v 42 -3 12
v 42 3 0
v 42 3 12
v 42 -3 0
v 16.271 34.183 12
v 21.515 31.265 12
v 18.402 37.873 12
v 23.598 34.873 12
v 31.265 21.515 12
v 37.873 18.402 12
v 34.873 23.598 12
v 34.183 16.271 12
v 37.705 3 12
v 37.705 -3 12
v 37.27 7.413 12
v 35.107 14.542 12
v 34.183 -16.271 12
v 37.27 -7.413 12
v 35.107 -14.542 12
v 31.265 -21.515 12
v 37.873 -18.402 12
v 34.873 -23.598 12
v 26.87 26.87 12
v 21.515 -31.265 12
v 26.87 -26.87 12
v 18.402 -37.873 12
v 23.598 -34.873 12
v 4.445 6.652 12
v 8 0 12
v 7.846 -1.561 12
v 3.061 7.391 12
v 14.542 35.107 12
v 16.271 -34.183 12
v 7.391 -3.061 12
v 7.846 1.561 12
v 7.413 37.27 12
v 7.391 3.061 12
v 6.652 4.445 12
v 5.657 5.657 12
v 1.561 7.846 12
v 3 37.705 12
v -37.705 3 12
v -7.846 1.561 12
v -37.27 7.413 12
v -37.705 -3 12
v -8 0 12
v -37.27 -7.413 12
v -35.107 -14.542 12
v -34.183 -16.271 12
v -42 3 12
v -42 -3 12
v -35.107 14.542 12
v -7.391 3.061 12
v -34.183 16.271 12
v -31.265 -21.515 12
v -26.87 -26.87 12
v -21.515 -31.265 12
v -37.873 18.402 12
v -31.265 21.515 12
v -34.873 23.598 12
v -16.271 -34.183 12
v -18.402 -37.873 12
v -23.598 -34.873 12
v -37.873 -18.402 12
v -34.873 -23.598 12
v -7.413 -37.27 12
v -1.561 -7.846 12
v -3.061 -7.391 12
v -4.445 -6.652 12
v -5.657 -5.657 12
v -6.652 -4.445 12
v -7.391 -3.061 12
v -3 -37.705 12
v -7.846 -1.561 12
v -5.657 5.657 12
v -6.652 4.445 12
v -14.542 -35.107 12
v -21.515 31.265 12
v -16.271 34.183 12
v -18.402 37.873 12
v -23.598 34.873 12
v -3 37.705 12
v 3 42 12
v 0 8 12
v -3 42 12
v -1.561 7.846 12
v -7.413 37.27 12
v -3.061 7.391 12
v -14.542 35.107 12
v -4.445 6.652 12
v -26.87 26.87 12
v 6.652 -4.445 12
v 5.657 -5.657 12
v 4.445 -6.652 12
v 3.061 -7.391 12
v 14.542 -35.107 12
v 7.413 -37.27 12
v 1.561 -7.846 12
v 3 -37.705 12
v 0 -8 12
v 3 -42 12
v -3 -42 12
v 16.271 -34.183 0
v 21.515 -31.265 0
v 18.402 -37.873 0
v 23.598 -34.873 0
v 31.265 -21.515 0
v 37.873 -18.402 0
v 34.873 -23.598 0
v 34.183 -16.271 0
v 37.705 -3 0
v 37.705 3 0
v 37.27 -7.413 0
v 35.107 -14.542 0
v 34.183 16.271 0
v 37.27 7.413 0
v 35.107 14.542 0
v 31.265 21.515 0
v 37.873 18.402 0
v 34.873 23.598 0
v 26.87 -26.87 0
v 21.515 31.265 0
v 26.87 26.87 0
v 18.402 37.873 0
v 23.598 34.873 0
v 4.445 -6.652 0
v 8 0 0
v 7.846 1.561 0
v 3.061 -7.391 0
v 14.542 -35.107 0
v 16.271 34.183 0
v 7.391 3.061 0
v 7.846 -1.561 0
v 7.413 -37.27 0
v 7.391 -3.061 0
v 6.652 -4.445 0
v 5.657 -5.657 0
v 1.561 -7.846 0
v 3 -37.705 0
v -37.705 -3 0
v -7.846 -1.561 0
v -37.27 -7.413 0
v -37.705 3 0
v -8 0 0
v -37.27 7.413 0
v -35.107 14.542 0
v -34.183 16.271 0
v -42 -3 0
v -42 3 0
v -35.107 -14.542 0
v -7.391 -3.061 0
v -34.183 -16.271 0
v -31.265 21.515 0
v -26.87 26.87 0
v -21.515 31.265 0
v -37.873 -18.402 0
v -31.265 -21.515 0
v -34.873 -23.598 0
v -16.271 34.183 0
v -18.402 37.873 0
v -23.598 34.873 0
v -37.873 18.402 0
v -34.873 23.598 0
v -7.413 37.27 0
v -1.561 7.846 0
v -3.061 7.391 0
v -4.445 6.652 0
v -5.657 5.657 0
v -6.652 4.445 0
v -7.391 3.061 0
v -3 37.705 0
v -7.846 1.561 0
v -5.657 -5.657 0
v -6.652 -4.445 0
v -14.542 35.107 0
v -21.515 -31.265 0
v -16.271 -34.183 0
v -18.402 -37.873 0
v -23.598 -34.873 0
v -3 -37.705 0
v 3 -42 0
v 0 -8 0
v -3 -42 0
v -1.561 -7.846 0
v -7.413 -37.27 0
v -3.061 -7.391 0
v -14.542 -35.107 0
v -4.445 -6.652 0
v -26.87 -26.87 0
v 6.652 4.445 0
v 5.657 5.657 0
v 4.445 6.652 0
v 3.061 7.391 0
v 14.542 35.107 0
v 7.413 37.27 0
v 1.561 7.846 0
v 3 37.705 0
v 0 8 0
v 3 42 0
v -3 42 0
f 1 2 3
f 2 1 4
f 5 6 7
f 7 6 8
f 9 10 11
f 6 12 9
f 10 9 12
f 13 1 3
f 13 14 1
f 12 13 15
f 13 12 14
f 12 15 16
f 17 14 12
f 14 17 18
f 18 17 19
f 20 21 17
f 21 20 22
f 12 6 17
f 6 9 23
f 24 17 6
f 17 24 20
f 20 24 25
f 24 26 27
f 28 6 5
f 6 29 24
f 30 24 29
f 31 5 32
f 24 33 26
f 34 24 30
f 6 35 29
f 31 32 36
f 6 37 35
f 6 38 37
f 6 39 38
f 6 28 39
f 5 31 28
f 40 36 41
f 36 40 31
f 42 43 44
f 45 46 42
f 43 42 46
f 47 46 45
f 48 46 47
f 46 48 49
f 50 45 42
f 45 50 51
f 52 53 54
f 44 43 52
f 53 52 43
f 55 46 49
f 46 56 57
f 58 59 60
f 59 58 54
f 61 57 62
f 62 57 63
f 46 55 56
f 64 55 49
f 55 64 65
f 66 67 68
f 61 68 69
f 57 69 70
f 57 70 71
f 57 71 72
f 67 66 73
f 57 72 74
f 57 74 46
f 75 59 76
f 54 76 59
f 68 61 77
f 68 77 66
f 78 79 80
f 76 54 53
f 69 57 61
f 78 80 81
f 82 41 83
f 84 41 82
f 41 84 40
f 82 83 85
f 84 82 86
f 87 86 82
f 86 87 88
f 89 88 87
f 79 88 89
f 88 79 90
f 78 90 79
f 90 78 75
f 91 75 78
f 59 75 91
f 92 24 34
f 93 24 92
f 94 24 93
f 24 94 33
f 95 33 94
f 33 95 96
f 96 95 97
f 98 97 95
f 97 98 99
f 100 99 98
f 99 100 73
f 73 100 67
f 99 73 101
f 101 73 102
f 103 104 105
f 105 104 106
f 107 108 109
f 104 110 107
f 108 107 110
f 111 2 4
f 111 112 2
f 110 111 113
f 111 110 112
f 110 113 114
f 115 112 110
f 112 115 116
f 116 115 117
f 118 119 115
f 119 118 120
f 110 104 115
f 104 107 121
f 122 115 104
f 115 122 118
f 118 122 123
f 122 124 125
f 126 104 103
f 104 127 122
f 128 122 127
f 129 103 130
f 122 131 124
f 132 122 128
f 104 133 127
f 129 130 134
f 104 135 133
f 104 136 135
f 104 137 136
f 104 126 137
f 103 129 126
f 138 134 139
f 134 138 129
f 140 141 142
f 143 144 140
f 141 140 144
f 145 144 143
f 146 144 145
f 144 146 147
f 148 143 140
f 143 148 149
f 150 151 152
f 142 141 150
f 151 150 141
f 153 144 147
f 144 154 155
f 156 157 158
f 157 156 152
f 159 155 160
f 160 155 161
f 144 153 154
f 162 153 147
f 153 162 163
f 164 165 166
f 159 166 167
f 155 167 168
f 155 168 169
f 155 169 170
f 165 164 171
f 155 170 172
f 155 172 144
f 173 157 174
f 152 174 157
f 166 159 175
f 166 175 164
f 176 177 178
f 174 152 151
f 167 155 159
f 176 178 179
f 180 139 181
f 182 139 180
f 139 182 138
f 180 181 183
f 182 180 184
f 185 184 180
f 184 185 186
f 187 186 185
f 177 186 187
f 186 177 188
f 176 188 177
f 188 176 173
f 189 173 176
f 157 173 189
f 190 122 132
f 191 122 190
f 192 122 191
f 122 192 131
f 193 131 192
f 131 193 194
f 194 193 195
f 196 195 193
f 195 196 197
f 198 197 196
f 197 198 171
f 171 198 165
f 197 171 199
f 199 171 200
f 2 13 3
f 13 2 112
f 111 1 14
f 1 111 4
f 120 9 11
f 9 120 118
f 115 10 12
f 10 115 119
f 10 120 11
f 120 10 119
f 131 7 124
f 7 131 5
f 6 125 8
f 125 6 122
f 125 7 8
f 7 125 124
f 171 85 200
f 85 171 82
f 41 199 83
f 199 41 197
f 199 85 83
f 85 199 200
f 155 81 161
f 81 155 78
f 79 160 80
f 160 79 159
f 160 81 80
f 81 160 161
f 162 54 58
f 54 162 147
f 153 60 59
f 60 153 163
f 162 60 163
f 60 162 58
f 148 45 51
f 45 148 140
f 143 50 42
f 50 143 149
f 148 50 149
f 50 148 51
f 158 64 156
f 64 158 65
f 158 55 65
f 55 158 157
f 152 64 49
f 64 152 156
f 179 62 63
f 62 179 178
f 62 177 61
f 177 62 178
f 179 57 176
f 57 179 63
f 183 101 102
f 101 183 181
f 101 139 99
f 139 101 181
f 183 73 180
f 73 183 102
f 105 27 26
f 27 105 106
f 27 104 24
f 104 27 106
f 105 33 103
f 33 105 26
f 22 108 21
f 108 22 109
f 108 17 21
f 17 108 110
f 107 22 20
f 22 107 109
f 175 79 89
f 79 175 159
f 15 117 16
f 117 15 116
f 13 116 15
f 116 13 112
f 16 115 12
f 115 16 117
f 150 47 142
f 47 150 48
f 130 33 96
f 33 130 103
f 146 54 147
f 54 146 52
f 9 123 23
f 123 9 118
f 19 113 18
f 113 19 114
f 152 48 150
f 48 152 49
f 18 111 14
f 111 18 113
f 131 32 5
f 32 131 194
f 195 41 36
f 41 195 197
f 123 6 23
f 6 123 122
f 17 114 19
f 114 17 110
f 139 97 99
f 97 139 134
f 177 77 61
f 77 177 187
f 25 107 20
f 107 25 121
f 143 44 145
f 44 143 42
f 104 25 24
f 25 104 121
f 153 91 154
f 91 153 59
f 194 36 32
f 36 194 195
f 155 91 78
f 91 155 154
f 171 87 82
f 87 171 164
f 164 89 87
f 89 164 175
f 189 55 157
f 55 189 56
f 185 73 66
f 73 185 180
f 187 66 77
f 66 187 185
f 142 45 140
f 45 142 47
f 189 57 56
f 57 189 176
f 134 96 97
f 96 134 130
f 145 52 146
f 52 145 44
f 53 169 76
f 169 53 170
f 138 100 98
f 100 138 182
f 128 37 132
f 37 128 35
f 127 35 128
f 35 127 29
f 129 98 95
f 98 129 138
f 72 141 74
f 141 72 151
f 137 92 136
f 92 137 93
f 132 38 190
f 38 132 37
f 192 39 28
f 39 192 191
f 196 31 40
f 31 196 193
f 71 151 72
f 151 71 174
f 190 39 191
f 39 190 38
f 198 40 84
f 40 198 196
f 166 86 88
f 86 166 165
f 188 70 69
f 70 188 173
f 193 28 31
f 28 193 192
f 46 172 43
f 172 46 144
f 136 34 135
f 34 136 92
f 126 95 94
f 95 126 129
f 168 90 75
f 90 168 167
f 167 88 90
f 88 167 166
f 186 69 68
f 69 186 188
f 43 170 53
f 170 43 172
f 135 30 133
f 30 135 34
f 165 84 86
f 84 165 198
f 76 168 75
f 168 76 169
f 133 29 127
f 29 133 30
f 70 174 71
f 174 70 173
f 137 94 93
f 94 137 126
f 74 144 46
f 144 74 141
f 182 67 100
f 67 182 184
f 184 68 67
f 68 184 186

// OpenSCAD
$fn = 32;

// ----------------------------------------------------------------------
// Spur blank: bored gear blank
// ----------------------------------------------------------------------

// --- parameters (mm) ---
disc_r = 38;              // blank root radius
disc_t = 12;              // blank thickness
n_teeth = 12;             // stub tooth count
tooth_w = 6;              // tooth width at the root
tooth_h = 4;              // tooth height above the root
bore_r = 8;               // central bore radius

out_r = disc_r + tooth_h;  // tip radius
bbox_x = 84.0;  // measured width over the teeth
bbox_y = 84.0;  // measured depth over the teeth

difference() {
union() {
  cylinder(r = disc_r, h = disc_t);
  for (i = [0 : n_teeth - 1])
    rotate([0, 0, i * 360 / n_teeth])
      translate([disc_r - 1, -tooth_w / 2, 0])
        cube([tooth_h + 1, tooth_w, disc_t]);
}
  translate([0, 0, -1]) cylinder(r = bore_r, h = disc_t + 2);
}
